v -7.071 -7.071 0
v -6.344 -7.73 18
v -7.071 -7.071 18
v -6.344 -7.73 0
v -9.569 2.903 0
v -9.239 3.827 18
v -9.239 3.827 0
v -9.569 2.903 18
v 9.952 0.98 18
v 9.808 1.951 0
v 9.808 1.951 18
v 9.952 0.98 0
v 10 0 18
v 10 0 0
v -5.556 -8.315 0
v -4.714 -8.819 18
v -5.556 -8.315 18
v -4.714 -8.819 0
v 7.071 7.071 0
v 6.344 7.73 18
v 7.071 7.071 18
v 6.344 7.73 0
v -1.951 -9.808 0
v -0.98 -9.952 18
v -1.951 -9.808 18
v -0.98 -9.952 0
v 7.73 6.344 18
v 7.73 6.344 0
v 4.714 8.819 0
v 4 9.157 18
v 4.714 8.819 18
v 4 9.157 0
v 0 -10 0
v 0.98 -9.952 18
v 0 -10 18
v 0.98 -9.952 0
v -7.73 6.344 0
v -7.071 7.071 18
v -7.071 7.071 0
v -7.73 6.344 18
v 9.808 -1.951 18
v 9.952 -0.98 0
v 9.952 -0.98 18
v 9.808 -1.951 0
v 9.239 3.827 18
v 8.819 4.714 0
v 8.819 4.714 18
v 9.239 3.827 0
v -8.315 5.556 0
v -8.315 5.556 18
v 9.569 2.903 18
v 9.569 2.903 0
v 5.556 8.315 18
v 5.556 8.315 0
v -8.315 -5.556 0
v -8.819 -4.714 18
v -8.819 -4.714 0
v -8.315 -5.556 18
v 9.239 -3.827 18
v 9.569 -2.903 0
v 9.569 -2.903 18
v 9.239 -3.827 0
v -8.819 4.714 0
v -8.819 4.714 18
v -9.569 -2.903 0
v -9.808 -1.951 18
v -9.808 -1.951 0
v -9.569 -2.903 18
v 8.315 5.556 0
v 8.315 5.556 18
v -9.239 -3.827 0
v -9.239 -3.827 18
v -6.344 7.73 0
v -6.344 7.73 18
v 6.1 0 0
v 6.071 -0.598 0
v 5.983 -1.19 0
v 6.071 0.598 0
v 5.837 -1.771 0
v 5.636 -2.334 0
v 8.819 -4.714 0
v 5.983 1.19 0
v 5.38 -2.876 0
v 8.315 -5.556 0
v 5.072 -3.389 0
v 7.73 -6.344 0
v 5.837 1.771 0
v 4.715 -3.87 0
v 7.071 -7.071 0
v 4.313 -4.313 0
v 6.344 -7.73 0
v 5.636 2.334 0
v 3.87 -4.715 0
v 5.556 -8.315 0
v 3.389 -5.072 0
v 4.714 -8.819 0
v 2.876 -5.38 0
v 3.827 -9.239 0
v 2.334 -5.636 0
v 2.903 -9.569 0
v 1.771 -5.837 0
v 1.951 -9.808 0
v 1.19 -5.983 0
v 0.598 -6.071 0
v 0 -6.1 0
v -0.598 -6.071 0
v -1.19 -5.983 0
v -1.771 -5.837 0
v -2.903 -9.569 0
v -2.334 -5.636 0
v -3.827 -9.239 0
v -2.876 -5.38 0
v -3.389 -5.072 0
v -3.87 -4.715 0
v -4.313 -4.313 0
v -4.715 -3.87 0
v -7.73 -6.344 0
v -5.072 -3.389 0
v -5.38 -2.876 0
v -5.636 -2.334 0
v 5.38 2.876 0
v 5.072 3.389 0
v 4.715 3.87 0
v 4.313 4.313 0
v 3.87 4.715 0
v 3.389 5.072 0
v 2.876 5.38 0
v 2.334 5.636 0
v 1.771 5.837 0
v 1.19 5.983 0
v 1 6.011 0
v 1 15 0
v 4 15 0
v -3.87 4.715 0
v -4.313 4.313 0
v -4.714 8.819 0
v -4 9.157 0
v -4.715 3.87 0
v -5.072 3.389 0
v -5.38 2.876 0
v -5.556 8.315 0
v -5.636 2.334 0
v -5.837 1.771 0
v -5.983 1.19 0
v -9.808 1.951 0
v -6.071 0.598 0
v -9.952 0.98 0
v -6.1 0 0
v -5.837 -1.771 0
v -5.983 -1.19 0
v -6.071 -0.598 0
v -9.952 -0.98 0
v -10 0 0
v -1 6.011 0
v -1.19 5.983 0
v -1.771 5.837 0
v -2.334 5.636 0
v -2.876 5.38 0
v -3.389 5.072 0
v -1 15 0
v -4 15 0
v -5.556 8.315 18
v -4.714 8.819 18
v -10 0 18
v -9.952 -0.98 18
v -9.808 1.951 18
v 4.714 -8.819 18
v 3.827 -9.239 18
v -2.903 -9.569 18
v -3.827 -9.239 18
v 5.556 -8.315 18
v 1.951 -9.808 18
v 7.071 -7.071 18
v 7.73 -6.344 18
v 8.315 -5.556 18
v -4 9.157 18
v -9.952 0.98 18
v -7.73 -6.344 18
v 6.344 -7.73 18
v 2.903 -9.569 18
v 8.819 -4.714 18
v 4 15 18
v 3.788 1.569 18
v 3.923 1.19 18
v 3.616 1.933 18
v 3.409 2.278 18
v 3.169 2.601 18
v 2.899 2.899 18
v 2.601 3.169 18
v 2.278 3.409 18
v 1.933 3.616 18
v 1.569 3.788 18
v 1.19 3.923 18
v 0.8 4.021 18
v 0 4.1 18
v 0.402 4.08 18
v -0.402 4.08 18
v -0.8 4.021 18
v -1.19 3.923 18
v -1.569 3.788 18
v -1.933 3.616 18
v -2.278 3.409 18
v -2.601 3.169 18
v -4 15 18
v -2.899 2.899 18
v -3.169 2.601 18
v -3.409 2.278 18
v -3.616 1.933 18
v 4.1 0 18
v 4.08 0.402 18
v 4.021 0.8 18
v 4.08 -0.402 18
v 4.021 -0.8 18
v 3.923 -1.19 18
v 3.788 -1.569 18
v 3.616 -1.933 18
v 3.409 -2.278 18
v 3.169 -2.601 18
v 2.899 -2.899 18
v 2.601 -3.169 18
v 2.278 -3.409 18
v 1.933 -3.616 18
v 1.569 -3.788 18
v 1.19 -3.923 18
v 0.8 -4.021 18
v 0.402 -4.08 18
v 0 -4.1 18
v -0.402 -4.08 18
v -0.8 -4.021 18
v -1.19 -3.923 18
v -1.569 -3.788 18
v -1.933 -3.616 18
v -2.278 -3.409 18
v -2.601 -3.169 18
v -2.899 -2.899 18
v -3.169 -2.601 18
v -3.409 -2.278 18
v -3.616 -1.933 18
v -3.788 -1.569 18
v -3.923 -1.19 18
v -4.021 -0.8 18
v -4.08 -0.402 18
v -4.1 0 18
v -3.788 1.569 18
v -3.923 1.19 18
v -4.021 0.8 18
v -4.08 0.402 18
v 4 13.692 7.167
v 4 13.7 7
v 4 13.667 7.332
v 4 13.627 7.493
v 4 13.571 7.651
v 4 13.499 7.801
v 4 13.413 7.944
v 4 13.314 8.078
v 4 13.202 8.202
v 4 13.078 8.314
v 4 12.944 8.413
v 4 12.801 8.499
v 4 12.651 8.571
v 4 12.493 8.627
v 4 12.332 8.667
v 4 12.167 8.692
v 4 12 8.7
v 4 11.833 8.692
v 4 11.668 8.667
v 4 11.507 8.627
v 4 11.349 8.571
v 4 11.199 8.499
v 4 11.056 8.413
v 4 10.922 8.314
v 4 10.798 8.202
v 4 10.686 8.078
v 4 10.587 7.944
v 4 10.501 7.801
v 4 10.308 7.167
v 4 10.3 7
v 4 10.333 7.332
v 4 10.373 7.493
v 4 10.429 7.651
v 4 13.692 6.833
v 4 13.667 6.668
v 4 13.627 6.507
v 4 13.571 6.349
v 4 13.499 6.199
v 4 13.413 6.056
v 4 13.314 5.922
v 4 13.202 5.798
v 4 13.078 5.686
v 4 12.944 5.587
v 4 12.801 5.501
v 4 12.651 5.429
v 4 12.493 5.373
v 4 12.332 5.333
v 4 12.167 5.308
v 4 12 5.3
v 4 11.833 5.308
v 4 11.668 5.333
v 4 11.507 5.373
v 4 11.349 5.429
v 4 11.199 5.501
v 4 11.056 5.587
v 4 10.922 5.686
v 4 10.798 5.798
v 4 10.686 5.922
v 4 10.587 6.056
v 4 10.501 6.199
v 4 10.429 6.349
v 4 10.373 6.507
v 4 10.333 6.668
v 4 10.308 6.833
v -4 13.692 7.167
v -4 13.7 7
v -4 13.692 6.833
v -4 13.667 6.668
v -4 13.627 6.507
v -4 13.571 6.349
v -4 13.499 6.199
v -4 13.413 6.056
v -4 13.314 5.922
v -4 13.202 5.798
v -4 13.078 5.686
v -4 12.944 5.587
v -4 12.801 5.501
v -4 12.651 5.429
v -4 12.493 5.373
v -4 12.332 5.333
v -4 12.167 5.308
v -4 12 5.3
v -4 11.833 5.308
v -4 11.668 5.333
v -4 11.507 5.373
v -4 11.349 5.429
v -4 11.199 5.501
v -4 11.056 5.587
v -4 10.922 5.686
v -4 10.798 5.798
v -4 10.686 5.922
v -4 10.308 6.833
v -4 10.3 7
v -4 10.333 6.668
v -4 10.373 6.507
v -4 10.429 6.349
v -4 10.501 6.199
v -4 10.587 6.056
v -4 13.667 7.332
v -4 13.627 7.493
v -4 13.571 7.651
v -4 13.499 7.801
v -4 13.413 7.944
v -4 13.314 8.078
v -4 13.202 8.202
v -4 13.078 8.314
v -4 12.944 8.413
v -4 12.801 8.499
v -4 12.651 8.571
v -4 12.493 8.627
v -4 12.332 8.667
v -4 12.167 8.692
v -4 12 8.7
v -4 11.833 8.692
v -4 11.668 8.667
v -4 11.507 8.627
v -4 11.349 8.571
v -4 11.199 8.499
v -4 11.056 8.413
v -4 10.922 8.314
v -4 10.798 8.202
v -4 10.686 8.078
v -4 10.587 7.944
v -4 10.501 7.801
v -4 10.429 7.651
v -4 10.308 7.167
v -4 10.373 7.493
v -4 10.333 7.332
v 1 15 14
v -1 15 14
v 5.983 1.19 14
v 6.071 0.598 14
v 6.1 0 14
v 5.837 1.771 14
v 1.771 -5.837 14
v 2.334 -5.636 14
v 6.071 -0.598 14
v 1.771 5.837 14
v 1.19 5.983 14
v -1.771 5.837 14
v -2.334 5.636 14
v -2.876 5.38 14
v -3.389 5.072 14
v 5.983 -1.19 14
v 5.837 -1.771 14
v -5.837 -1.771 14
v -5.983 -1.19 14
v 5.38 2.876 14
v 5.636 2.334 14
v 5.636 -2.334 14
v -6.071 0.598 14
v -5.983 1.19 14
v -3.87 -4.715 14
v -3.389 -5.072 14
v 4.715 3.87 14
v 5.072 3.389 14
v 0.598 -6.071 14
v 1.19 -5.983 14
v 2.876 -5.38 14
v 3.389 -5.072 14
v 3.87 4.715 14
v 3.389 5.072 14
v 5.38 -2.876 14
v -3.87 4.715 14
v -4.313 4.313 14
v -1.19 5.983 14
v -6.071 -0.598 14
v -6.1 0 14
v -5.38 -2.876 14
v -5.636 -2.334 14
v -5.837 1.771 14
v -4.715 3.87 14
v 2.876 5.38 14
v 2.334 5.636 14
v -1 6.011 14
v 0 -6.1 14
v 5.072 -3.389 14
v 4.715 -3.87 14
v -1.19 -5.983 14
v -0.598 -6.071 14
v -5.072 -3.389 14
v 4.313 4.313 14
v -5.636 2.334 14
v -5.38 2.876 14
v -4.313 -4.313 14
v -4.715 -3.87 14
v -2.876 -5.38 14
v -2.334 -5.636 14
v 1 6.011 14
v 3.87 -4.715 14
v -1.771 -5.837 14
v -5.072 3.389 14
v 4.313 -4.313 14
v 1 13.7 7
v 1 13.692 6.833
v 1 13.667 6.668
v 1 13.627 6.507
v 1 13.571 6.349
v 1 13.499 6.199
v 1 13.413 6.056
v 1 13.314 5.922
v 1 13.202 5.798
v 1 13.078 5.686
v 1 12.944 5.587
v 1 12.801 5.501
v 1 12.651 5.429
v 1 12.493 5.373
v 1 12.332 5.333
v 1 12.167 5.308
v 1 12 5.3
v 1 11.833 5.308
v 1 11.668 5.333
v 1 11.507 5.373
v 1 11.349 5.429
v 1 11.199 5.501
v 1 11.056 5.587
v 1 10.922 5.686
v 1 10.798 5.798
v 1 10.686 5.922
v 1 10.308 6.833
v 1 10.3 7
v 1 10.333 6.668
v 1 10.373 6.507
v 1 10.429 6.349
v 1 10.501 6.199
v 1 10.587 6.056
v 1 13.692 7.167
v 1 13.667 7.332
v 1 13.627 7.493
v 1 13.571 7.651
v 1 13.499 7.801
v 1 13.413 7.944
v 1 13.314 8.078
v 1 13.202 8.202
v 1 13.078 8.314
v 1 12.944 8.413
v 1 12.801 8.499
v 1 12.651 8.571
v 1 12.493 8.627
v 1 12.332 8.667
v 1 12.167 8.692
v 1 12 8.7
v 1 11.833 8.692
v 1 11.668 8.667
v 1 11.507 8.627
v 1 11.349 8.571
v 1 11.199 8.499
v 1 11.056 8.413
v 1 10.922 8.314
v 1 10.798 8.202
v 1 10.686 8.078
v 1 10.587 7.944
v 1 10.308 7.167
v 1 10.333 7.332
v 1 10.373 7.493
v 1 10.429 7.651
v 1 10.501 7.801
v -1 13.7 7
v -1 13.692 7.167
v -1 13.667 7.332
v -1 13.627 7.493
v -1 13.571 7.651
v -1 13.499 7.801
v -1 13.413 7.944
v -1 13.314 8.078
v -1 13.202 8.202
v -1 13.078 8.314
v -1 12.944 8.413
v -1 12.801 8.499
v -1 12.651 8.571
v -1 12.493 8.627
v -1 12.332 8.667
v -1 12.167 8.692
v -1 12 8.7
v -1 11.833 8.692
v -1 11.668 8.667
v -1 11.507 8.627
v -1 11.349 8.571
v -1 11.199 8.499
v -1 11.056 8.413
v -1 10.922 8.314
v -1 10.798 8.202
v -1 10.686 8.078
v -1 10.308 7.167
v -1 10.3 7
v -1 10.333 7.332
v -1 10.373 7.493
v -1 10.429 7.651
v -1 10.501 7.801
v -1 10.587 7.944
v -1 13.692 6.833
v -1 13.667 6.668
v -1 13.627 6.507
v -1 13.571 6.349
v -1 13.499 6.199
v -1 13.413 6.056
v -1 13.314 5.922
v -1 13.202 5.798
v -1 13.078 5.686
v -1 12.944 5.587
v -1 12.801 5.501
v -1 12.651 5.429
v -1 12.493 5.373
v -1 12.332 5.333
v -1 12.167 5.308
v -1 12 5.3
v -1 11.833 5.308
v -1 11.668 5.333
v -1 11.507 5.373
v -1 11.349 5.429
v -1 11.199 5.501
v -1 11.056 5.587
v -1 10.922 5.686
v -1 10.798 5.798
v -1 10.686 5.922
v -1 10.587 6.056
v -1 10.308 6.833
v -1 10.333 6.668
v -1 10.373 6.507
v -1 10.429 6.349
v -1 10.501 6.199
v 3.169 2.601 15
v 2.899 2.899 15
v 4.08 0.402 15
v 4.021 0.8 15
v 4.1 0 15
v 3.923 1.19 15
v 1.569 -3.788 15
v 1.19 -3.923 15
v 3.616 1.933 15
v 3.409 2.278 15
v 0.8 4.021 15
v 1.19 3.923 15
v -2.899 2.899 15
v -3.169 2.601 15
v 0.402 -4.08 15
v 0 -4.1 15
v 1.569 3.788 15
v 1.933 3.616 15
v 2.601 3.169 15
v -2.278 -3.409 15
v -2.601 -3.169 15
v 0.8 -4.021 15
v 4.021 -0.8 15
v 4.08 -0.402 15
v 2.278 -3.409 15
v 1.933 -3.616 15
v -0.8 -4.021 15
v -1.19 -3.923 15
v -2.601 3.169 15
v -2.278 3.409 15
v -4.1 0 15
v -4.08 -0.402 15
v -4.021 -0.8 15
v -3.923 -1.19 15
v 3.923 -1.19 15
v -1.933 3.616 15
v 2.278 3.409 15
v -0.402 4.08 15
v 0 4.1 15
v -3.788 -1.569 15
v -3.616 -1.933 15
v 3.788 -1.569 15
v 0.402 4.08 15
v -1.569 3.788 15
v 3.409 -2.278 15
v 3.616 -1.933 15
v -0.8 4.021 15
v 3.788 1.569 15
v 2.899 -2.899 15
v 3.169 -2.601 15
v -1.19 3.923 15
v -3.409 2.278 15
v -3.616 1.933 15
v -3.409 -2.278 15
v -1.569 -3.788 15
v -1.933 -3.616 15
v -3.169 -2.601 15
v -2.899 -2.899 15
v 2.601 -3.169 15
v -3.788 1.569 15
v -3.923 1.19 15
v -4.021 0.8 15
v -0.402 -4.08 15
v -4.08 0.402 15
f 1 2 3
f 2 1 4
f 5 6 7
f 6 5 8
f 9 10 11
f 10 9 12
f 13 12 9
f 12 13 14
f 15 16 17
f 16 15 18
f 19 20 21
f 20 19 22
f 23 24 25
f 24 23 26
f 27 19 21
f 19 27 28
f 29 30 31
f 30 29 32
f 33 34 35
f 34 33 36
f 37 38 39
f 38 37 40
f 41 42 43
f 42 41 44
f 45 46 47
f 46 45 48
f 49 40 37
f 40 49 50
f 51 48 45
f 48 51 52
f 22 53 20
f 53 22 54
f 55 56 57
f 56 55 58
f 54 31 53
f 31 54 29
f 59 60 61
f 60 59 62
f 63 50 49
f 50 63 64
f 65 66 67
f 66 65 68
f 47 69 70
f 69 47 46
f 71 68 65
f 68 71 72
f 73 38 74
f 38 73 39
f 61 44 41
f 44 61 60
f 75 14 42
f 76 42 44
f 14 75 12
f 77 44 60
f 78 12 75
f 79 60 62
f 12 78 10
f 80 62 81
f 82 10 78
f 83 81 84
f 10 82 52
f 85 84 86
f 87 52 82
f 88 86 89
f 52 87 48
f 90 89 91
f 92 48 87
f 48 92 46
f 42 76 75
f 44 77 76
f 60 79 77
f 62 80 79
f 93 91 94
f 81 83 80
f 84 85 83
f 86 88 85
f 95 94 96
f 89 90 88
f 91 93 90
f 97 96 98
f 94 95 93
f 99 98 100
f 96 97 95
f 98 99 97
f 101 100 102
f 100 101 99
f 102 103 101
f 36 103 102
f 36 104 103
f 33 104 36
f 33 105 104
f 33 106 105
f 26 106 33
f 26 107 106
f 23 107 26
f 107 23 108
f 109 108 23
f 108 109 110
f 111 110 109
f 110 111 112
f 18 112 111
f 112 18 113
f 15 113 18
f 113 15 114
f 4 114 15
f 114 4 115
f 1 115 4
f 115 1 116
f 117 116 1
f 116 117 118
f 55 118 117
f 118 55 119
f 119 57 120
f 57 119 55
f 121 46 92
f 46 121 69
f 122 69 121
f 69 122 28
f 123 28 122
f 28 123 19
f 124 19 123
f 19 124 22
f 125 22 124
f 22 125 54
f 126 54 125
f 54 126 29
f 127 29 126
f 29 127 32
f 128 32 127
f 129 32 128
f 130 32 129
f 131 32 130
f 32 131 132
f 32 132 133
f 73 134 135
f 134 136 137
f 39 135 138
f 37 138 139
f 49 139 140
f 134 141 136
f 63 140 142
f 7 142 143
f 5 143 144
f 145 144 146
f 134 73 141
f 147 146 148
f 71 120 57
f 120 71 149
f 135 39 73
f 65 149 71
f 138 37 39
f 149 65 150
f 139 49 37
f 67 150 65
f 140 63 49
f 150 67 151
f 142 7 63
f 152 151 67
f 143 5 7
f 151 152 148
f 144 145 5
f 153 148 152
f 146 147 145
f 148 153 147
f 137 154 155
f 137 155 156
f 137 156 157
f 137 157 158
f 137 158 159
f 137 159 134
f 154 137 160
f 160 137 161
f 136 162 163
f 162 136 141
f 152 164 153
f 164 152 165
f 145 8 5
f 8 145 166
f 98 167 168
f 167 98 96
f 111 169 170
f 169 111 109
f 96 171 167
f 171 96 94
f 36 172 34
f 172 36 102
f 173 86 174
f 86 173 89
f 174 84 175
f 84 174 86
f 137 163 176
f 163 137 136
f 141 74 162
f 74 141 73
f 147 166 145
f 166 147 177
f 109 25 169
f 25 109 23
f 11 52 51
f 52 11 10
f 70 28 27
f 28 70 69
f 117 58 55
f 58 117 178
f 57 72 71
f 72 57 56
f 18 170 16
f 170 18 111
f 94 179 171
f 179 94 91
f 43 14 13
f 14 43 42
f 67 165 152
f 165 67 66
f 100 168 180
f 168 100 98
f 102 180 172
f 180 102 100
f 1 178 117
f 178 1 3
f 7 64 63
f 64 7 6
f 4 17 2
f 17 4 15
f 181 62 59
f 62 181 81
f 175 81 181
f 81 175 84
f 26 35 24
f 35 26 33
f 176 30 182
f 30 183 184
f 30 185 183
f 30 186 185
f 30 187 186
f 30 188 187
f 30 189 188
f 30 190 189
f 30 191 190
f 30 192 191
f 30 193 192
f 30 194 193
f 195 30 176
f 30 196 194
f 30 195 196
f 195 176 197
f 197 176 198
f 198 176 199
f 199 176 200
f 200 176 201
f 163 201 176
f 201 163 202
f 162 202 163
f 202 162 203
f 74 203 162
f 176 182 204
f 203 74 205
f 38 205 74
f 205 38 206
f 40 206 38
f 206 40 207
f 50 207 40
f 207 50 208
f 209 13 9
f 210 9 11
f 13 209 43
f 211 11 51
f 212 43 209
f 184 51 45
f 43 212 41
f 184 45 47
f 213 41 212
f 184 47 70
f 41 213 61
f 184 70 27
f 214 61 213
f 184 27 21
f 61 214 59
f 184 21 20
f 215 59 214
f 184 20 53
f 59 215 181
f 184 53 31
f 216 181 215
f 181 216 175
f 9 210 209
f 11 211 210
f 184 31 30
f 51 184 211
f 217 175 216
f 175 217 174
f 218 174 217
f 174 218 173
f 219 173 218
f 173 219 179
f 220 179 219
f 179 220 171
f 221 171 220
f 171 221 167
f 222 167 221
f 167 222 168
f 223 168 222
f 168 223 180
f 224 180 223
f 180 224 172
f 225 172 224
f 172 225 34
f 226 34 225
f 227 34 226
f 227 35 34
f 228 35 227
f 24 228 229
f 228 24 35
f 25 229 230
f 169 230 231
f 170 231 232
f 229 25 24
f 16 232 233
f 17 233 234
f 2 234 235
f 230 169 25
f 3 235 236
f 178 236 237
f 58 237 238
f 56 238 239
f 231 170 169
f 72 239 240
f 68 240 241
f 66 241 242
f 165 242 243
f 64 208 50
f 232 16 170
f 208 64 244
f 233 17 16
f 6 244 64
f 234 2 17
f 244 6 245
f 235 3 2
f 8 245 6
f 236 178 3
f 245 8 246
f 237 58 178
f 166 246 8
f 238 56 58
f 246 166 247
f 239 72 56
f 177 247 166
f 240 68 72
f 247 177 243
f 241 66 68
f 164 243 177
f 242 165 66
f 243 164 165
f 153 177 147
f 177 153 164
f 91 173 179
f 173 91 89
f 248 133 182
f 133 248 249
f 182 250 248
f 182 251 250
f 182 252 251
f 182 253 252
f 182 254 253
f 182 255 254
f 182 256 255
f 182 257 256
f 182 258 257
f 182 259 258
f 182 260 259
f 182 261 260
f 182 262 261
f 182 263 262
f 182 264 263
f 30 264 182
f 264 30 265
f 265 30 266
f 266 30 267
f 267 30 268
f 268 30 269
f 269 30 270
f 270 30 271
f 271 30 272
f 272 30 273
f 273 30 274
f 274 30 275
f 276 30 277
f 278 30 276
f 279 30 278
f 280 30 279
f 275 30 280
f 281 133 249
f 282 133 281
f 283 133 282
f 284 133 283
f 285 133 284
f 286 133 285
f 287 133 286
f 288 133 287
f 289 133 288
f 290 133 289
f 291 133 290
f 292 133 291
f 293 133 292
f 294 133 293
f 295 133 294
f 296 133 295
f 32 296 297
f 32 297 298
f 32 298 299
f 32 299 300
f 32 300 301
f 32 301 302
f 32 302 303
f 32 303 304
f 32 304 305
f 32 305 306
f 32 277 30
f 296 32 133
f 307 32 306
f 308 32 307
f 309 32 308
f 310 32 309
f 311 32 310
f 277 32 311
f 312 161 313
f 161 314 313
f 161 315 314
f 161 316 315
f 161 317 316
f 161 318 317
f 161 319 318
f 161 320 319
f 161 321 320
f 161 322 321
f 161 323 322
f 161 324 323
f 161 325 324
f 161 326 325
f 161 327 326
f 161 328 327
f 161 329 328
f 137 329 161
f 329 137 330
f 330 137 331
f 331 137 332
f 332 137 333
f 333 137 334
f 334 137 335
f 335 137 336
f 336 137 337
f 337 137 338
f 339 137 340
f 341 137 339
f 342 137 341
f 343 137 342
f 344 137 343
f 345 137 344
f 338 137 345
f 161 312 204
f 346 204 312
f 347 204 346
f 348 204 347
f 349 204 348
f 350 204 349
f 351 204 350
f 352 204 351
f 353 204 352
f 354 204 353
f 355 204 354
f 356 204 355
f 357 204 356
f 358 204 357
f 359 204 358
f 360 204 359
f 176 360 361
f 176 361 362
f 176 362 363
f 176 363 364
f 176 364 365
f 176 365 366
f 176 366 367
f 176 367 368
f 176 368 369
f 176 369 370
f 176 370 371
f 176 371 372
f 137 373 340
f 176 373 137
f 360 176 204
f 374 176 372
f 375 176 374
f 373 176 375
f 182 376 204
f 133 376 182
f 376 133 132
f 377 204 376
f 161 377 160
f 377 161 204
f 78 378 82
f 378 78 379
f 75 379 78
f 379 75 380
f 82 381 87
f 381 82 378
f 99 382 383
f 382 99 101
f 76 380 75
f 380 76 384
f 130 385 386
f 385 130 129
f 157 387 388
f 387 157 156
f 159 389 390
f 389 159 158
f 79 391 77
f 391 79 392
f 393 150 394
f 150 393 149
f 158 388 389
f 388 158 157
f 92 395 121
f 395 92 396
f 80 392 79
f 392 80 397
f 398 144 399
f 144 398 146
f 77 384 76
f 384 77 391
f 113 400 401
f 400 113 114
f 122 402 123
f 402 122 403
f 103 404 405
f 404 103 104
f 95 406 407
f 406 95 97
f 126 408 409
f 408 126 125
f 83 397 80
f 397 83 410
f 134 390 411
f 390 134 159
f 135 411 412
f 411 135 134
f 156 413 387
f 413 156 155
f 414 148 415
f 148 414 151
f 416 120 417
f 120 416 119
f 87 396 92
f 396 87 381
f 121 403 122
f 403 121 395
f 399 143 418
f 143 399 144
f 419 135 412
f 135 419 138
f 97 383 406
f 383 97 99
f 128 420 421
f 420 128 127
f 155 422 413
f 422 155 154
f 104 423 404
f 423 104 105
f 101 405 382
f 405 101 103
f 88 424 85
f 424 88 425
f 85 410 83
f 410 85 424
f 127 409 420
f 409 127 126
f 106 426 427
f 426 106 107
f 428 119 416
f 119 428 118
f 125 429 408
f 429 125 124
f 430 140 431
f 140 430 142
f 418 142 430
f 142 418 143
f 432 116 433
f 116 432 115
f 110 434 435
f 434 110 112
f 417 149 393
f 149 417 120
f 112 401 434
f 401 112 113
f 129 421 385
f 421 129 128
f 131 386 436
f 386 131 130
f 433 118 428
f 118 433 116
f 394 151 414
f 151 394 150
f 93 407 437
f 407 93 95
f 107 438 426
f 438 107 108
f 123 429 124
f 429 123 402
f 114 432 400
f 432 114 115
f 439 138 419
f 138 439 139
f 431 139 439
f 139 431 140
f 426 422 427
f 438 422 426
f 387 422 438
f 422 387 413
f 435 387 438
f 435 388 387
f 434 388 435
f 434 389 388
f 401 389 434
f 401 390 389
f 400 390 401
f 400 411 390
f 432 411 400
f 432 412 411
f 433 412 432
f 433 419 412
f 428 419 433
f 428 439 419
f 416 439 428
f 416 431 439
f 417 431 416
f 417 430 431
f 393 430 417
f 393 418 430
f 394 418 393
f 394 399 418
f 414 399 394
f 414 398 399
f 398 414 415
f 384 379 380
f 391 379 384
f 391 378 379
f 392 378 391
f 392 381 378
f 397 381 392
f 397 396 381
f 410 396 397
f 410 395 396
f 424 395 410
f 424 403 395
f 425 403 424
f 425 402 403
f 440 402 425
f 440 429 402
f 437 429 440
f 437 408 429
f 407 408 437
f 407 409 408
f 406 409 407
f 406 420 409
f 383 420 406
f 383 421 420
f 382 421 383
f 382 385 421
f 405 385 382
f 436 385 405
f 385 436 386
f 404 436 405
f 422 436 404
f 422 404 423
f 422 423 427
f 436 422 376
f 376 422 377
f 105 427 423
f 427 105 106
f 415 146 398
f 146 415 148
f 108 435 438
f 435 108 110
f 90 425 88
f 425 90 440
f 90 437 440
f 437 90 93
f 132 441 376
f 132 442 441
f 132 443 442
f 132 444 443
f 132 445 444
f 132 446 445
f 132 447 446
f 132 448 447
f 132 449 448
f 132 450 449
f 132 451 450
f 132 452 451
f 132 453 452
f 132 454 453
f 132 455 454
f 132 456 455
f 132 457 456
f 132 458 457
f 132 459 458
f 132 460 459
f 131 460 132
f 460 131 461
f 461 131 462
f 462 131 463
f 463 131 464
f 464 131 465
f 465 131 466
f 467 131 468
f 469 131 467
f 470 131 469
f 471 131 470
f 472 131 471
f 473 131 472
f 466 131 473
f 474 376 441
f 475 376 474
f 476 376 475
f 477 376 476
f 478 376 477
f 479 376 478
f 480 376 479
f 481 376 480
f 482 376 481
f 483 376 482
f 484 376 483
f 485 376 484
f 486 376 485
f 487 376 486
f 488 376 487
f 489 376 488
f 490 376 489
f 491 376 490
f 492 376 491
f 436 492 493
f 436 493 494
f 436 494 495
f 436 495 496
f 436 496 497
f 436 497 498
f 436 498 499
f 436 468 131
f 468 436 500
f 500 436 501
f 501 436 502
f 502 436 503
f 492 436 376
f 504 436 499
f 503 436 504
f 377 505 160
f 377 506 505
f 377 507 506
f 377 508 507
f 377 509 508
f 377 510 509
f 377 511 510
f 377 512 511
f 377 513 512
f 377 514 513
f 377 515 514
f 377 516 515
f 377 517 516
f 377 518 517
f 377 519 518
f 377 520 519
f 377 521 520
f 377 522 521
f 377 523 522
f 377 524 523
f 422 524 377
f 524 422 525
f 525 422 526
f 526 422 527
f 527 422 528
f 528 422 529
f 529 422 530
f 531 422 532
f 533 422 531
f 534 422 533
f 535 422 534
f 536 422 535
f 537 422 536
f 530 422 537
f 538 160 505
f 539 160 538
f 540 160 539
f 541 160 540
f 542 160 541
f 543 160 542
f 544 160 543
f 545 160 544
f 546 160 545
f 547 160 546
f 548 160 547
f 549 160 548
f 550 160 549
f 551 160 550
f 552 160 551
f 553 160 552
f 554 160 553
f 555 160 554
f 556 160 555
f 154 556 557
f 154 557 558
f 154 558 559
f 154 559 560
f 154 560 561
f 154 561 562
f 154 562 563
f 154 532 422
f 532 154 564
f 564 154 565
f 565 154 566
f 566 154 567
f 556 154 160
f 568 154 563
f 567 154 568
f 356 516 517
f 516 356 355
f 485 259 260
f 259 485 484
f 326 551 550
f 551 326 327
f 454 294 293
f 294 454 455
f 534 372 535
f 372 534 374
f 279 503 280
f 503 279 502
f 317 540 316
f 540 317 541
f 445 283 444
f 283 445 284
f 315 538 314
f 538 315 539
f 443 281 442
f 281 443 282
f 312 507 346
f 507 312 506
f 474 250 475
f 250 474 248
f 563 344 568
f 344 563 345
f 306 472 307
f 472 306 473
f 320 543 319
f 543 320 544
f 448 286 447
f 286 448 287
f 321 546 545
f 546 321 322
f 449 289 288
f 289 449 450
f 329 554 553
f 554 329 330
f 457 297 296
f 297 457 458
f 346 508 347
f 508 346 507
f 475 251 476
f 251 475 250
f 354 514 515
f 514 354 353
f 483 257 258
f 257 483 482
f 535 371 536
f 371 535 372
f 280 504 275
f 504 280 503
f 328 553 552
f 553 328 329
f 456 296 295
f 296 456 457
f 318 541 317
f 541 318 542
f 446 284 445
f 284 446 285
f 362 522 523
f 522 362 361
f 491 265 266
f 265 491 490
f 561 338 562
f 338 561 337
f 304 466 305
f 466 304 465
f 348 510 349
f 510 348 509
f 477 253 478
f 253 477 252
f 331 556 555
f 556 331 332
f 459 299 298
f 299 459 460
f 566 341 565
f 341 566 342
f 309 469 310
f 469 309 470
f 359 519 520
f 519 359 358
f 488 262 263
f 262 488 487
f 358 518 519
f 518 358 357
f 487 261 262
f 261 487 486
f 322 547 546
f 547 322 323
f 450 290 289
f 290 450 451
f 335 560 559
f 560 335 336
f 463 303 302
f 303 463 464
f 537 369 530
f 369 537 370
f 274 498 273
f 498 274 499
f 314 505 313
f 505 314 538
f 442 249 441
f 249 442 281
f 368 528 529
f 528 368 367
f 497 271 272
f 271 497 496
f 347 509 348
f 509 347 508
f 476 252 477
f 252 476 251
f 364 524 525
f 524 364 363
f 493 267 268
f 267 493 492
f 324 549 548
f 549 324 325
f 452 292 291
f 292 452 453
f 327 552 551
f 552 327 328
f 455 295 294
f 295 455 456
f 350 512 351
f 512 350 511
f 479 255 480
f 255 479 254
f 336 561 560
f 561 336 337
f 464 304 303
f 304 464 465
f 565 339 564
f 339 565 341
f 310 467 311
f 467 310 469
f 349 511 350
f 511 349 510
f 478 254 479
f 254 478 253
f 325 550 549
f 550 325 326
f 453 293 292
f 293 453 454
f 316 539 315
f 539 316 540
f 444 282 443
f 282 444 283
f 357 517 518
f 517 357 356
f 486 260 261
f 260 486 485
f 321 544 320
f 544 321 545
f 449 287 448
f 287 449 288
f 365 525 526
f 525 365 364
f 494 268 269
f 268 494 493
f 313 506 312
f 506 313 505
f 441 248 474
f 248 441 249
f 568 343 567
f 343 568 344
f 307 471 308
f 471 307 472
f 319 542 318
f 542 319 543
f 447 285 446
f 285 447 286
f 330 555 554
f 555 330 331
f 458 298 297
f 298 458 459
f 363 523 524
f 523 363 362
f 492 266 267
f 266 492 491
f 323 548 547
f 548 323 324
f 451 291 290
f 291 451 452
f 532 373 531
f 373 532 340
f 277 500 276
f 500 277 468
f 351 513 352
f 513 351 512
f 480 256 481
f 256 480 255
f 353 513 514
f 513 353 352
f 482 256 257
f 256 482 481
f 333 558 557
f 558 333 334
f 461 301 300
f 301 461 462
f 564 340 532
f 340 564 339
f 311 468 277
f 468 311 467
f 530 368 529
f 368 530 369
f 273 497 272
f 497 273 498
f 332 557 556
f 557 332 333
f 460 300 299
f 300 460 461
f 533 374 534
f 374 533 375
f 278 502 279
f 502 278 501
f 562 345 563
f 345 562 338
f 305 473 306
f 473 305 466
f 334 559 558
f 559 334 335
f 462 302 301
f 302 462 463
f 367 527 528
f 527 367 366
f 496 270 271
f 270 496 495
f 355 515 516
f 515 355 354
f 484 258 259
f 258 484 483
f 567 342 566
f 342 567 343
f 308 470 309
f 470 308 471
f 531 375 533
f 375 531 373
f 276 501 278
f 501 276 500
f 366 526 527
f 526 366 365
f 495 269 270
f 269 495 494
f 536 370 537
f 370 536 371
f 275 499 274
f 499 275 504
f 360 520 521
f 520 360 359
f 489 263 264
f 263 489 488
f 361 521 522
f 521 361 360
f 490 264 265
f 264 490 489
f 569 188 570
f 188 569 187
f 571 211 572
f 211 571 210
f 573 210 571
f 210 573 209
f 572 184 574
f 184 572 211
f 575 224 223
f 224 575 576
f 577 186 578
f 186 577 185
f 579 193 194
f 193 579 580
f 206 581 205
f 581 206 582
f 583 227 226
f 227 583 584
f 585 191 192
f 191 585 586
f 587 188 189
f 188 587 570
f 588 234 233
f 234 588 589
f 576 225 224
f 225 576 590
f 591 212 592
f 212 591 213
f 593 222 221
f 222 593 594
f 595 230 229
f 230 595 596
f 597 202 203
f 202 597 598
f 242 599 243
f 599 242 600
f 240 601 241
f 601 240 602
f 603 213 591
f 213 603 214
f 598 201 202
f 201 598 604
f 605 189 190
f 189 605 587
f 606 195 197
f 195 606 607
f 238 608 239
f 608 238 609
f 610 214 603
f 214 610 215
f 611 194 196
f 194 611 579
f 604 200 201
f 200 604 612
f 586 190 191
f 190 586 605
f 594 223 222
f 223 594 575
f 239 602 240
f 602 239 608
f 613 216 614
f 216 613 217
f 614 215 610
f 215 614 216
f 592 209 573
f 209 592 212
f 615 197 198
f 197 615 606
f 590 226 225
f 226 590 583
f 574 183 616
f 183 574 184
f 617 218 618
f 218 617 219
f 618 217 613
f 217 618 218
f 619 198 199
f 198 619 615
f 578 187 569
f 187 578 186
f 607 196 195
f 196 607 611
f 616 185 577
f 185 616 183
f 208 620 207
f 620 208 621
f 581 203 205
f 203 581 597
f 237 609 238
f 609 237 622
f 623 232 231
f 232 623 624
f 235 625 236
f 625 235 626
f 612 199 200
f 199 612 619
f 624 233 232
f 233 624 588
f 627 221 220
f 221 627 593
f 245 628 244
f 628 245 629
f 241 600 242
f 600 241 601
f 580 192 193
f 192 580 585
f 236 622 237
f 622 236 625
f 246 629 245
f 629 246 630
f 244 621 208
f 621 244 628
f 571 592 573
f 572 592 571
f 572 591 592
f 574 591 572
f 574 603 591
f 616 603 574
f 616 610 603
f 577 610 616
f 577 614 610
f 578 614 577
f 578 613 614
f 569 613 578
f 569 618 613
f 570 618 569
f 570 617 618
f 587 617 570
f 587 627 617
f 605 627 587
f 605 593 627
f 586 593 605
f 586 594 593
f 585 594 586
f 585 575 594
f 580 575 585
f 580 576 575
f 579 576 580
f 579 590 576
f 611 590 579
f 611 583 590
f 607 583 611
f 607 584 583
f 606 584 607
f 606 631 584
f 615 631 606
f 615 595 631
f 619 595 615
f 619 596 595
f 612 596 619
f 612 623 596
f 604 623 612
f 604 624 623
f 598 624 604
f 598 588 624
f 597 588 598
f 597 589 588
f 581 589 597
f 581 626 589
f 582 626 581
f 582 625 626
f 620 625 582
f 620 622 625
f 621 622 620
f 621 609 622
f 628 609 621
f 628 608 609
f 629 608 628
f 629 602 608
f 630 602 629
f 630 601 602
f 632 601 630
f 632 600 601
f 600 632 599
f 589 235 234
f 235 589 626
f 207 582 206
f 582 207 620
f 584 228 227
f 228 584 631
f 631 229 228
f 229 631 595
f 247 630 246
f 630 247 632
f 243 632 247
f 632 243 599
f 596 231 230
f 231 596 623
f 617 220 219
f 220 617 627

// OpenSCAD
// SPDX-License-Identifier: CERN-OHL-P-2.0
// einfachstoppen Startstab -- Halter fuer Magnet und Reedkontakt (OpenSCAD).
//
// Gerendert (ohne Fehler), aber NICHT GEDRUCKT und fuer den Druck nicht geprueft. Alle Masse sind Annahmen:
// Stange, Magnet und Reed nachmessen und hier eintragen, bevor etwas gedruckt wird.
//
//   openscad -o stab_magnethalter.stl -D 'teil="magnethalter"' gehaeuse/stab.scad
//   openscad -o stab_reedhalter.stl   -D 'teil="reedhalter"'   gehaeuse/stab.scad
//
// Der Magnethalter klemmt am Stangenende und haelt den Scheibenmagneten mit der Stirnseite
// nach vorn. Der Reedhalter wird mit zwei Holzschrauben an den Pfosten geschraubt und haelt
// das Glasroehrchen so, dass es dem Magneten bei anliegender Stange gegenuebersteht.
// Das Gehaeuse fuer den ESP32 ist gehaeuse/tor.scad mit variante="stab".
//
// Material: PETG, 0,2 mm Schicht, 3 Wandlinien.

teil = "magnethalter";   // "magnethalter" oder "reedhalter"

// --- Annahmen: nachmessen! ---
stab_d    = 12;    // Durchmesser der Stange (Rundstab)
magnet_d  = 8;     // Scheibenmagnet, Durchmesser
magnet_h  = 3;     // Scheibenmagnet, Dicke
reed_l    = 14;    // Glasroehrchen des Reeds, Laenge
reed_d    = 2.8;   // Glasroehrchen, Durchmesser (Datenblatt!)
spiel     = 0.2;   // Passungsspiel
schraube_d = 3.4;  // Durchgang fuer M3 (Klemmung) und Loch fuer Holzschraube

$fn = 64;

// Klemmring am Stangenende. Die Bohrung ist von hinten blind (Stange stoesst an), in der
// Stirnwand sitzt der Magnet in einer offenen Tasche.
module magnethalter() {
  wand = 4;            // Ringwand
  stirn = 4;           // Stirnwand
  bohr_t = 14;         // Tiefe der Bohrung, von hinten
  laenge = bohr_t + stirn;
  aussen = stab_d + 2 * wand;
  difference() {
    union() {
      cylinder(d = aussen, h = laenge);
      // Ohr fuer die Klemmschraube (Quer zum Schlitz)
      translate([-4, aussen / 2 - 1, 0]) cube([8, 6, laenge]);
    }
    // Bohrung fuer die Stange (von z = 0, blind)
    translate([0, 0, -0.01]) cylinder(d = stab_d + spiel, h = bohr_t + 0.01);
    // Schlitz durch Wand und Ohr, damit sich der Ring zuziehen laesst
    translate([-1, 0, -0.01]) cube([2, aussen / 2 + 7, bohr_t + 0.01]);
    // Klemmschraube M3 quer durch das Ohr
    translate([0, aussen / 2 + 2, bohr_t / 2]) rotate([0, 90, 0])
      translate([0, 0, -6]) cylinder(d = schraube_d, h = 12);
    // Tasche fuer den Magneten, von der Stirnseite
    translate([0, 0, laenge - magnet_h]) cylinder(d = magnet_d + spiel, h = magnet_h + 0.01);
  }
}

// Block mit Kanal fuer das Glasroehrchen und zwei Schraublochern in die Rueckwand.
module reedhalter() {
  l = 30; b = 20; h = 16;
  difference() {
    cube([l, b, h]);
    // Kanal fuer das Glasroehrchen, von der Oberseite offen zum Einkleben
    translate([(l - reed_l) / 2 - 1, b / 2, h - reed_d / 2 - 0.4])
      rotate([0, 90, 0]) cylinder(d = reed_d + spiel, h = reed_l + 2);
    translate([(l - reed_l) / 2 - 1, b / 2 - (reed_d + spiel) / 2, h - reed_d / 2 - 0.4])
      cube([reed_l + 2, reed_d + spiel, reed_d]);
    // Kabelauslass nach hinten (zum ESP32)
    translate([-1, b / 2, h - reed_d / 2 - 0.4]) rotate([0, 90, 0]) cylinder(d = 2.4, h = (l - reed_l) / 2 + 1);
    // Zwei Holzschrauben von oben durch den Block in den Pfosten
    for (x = [5, l - 5])
      translate([x, b / 2, -0.01]) {
        cylinder(d = schraube_d, h = h - 4);
        translate([0, 0, h - 8]) cylinder(d = 6.5, h = 8.1);
      }
  }
}

if (teil == "magnethalter") magnethalter(); else reedhalter();
